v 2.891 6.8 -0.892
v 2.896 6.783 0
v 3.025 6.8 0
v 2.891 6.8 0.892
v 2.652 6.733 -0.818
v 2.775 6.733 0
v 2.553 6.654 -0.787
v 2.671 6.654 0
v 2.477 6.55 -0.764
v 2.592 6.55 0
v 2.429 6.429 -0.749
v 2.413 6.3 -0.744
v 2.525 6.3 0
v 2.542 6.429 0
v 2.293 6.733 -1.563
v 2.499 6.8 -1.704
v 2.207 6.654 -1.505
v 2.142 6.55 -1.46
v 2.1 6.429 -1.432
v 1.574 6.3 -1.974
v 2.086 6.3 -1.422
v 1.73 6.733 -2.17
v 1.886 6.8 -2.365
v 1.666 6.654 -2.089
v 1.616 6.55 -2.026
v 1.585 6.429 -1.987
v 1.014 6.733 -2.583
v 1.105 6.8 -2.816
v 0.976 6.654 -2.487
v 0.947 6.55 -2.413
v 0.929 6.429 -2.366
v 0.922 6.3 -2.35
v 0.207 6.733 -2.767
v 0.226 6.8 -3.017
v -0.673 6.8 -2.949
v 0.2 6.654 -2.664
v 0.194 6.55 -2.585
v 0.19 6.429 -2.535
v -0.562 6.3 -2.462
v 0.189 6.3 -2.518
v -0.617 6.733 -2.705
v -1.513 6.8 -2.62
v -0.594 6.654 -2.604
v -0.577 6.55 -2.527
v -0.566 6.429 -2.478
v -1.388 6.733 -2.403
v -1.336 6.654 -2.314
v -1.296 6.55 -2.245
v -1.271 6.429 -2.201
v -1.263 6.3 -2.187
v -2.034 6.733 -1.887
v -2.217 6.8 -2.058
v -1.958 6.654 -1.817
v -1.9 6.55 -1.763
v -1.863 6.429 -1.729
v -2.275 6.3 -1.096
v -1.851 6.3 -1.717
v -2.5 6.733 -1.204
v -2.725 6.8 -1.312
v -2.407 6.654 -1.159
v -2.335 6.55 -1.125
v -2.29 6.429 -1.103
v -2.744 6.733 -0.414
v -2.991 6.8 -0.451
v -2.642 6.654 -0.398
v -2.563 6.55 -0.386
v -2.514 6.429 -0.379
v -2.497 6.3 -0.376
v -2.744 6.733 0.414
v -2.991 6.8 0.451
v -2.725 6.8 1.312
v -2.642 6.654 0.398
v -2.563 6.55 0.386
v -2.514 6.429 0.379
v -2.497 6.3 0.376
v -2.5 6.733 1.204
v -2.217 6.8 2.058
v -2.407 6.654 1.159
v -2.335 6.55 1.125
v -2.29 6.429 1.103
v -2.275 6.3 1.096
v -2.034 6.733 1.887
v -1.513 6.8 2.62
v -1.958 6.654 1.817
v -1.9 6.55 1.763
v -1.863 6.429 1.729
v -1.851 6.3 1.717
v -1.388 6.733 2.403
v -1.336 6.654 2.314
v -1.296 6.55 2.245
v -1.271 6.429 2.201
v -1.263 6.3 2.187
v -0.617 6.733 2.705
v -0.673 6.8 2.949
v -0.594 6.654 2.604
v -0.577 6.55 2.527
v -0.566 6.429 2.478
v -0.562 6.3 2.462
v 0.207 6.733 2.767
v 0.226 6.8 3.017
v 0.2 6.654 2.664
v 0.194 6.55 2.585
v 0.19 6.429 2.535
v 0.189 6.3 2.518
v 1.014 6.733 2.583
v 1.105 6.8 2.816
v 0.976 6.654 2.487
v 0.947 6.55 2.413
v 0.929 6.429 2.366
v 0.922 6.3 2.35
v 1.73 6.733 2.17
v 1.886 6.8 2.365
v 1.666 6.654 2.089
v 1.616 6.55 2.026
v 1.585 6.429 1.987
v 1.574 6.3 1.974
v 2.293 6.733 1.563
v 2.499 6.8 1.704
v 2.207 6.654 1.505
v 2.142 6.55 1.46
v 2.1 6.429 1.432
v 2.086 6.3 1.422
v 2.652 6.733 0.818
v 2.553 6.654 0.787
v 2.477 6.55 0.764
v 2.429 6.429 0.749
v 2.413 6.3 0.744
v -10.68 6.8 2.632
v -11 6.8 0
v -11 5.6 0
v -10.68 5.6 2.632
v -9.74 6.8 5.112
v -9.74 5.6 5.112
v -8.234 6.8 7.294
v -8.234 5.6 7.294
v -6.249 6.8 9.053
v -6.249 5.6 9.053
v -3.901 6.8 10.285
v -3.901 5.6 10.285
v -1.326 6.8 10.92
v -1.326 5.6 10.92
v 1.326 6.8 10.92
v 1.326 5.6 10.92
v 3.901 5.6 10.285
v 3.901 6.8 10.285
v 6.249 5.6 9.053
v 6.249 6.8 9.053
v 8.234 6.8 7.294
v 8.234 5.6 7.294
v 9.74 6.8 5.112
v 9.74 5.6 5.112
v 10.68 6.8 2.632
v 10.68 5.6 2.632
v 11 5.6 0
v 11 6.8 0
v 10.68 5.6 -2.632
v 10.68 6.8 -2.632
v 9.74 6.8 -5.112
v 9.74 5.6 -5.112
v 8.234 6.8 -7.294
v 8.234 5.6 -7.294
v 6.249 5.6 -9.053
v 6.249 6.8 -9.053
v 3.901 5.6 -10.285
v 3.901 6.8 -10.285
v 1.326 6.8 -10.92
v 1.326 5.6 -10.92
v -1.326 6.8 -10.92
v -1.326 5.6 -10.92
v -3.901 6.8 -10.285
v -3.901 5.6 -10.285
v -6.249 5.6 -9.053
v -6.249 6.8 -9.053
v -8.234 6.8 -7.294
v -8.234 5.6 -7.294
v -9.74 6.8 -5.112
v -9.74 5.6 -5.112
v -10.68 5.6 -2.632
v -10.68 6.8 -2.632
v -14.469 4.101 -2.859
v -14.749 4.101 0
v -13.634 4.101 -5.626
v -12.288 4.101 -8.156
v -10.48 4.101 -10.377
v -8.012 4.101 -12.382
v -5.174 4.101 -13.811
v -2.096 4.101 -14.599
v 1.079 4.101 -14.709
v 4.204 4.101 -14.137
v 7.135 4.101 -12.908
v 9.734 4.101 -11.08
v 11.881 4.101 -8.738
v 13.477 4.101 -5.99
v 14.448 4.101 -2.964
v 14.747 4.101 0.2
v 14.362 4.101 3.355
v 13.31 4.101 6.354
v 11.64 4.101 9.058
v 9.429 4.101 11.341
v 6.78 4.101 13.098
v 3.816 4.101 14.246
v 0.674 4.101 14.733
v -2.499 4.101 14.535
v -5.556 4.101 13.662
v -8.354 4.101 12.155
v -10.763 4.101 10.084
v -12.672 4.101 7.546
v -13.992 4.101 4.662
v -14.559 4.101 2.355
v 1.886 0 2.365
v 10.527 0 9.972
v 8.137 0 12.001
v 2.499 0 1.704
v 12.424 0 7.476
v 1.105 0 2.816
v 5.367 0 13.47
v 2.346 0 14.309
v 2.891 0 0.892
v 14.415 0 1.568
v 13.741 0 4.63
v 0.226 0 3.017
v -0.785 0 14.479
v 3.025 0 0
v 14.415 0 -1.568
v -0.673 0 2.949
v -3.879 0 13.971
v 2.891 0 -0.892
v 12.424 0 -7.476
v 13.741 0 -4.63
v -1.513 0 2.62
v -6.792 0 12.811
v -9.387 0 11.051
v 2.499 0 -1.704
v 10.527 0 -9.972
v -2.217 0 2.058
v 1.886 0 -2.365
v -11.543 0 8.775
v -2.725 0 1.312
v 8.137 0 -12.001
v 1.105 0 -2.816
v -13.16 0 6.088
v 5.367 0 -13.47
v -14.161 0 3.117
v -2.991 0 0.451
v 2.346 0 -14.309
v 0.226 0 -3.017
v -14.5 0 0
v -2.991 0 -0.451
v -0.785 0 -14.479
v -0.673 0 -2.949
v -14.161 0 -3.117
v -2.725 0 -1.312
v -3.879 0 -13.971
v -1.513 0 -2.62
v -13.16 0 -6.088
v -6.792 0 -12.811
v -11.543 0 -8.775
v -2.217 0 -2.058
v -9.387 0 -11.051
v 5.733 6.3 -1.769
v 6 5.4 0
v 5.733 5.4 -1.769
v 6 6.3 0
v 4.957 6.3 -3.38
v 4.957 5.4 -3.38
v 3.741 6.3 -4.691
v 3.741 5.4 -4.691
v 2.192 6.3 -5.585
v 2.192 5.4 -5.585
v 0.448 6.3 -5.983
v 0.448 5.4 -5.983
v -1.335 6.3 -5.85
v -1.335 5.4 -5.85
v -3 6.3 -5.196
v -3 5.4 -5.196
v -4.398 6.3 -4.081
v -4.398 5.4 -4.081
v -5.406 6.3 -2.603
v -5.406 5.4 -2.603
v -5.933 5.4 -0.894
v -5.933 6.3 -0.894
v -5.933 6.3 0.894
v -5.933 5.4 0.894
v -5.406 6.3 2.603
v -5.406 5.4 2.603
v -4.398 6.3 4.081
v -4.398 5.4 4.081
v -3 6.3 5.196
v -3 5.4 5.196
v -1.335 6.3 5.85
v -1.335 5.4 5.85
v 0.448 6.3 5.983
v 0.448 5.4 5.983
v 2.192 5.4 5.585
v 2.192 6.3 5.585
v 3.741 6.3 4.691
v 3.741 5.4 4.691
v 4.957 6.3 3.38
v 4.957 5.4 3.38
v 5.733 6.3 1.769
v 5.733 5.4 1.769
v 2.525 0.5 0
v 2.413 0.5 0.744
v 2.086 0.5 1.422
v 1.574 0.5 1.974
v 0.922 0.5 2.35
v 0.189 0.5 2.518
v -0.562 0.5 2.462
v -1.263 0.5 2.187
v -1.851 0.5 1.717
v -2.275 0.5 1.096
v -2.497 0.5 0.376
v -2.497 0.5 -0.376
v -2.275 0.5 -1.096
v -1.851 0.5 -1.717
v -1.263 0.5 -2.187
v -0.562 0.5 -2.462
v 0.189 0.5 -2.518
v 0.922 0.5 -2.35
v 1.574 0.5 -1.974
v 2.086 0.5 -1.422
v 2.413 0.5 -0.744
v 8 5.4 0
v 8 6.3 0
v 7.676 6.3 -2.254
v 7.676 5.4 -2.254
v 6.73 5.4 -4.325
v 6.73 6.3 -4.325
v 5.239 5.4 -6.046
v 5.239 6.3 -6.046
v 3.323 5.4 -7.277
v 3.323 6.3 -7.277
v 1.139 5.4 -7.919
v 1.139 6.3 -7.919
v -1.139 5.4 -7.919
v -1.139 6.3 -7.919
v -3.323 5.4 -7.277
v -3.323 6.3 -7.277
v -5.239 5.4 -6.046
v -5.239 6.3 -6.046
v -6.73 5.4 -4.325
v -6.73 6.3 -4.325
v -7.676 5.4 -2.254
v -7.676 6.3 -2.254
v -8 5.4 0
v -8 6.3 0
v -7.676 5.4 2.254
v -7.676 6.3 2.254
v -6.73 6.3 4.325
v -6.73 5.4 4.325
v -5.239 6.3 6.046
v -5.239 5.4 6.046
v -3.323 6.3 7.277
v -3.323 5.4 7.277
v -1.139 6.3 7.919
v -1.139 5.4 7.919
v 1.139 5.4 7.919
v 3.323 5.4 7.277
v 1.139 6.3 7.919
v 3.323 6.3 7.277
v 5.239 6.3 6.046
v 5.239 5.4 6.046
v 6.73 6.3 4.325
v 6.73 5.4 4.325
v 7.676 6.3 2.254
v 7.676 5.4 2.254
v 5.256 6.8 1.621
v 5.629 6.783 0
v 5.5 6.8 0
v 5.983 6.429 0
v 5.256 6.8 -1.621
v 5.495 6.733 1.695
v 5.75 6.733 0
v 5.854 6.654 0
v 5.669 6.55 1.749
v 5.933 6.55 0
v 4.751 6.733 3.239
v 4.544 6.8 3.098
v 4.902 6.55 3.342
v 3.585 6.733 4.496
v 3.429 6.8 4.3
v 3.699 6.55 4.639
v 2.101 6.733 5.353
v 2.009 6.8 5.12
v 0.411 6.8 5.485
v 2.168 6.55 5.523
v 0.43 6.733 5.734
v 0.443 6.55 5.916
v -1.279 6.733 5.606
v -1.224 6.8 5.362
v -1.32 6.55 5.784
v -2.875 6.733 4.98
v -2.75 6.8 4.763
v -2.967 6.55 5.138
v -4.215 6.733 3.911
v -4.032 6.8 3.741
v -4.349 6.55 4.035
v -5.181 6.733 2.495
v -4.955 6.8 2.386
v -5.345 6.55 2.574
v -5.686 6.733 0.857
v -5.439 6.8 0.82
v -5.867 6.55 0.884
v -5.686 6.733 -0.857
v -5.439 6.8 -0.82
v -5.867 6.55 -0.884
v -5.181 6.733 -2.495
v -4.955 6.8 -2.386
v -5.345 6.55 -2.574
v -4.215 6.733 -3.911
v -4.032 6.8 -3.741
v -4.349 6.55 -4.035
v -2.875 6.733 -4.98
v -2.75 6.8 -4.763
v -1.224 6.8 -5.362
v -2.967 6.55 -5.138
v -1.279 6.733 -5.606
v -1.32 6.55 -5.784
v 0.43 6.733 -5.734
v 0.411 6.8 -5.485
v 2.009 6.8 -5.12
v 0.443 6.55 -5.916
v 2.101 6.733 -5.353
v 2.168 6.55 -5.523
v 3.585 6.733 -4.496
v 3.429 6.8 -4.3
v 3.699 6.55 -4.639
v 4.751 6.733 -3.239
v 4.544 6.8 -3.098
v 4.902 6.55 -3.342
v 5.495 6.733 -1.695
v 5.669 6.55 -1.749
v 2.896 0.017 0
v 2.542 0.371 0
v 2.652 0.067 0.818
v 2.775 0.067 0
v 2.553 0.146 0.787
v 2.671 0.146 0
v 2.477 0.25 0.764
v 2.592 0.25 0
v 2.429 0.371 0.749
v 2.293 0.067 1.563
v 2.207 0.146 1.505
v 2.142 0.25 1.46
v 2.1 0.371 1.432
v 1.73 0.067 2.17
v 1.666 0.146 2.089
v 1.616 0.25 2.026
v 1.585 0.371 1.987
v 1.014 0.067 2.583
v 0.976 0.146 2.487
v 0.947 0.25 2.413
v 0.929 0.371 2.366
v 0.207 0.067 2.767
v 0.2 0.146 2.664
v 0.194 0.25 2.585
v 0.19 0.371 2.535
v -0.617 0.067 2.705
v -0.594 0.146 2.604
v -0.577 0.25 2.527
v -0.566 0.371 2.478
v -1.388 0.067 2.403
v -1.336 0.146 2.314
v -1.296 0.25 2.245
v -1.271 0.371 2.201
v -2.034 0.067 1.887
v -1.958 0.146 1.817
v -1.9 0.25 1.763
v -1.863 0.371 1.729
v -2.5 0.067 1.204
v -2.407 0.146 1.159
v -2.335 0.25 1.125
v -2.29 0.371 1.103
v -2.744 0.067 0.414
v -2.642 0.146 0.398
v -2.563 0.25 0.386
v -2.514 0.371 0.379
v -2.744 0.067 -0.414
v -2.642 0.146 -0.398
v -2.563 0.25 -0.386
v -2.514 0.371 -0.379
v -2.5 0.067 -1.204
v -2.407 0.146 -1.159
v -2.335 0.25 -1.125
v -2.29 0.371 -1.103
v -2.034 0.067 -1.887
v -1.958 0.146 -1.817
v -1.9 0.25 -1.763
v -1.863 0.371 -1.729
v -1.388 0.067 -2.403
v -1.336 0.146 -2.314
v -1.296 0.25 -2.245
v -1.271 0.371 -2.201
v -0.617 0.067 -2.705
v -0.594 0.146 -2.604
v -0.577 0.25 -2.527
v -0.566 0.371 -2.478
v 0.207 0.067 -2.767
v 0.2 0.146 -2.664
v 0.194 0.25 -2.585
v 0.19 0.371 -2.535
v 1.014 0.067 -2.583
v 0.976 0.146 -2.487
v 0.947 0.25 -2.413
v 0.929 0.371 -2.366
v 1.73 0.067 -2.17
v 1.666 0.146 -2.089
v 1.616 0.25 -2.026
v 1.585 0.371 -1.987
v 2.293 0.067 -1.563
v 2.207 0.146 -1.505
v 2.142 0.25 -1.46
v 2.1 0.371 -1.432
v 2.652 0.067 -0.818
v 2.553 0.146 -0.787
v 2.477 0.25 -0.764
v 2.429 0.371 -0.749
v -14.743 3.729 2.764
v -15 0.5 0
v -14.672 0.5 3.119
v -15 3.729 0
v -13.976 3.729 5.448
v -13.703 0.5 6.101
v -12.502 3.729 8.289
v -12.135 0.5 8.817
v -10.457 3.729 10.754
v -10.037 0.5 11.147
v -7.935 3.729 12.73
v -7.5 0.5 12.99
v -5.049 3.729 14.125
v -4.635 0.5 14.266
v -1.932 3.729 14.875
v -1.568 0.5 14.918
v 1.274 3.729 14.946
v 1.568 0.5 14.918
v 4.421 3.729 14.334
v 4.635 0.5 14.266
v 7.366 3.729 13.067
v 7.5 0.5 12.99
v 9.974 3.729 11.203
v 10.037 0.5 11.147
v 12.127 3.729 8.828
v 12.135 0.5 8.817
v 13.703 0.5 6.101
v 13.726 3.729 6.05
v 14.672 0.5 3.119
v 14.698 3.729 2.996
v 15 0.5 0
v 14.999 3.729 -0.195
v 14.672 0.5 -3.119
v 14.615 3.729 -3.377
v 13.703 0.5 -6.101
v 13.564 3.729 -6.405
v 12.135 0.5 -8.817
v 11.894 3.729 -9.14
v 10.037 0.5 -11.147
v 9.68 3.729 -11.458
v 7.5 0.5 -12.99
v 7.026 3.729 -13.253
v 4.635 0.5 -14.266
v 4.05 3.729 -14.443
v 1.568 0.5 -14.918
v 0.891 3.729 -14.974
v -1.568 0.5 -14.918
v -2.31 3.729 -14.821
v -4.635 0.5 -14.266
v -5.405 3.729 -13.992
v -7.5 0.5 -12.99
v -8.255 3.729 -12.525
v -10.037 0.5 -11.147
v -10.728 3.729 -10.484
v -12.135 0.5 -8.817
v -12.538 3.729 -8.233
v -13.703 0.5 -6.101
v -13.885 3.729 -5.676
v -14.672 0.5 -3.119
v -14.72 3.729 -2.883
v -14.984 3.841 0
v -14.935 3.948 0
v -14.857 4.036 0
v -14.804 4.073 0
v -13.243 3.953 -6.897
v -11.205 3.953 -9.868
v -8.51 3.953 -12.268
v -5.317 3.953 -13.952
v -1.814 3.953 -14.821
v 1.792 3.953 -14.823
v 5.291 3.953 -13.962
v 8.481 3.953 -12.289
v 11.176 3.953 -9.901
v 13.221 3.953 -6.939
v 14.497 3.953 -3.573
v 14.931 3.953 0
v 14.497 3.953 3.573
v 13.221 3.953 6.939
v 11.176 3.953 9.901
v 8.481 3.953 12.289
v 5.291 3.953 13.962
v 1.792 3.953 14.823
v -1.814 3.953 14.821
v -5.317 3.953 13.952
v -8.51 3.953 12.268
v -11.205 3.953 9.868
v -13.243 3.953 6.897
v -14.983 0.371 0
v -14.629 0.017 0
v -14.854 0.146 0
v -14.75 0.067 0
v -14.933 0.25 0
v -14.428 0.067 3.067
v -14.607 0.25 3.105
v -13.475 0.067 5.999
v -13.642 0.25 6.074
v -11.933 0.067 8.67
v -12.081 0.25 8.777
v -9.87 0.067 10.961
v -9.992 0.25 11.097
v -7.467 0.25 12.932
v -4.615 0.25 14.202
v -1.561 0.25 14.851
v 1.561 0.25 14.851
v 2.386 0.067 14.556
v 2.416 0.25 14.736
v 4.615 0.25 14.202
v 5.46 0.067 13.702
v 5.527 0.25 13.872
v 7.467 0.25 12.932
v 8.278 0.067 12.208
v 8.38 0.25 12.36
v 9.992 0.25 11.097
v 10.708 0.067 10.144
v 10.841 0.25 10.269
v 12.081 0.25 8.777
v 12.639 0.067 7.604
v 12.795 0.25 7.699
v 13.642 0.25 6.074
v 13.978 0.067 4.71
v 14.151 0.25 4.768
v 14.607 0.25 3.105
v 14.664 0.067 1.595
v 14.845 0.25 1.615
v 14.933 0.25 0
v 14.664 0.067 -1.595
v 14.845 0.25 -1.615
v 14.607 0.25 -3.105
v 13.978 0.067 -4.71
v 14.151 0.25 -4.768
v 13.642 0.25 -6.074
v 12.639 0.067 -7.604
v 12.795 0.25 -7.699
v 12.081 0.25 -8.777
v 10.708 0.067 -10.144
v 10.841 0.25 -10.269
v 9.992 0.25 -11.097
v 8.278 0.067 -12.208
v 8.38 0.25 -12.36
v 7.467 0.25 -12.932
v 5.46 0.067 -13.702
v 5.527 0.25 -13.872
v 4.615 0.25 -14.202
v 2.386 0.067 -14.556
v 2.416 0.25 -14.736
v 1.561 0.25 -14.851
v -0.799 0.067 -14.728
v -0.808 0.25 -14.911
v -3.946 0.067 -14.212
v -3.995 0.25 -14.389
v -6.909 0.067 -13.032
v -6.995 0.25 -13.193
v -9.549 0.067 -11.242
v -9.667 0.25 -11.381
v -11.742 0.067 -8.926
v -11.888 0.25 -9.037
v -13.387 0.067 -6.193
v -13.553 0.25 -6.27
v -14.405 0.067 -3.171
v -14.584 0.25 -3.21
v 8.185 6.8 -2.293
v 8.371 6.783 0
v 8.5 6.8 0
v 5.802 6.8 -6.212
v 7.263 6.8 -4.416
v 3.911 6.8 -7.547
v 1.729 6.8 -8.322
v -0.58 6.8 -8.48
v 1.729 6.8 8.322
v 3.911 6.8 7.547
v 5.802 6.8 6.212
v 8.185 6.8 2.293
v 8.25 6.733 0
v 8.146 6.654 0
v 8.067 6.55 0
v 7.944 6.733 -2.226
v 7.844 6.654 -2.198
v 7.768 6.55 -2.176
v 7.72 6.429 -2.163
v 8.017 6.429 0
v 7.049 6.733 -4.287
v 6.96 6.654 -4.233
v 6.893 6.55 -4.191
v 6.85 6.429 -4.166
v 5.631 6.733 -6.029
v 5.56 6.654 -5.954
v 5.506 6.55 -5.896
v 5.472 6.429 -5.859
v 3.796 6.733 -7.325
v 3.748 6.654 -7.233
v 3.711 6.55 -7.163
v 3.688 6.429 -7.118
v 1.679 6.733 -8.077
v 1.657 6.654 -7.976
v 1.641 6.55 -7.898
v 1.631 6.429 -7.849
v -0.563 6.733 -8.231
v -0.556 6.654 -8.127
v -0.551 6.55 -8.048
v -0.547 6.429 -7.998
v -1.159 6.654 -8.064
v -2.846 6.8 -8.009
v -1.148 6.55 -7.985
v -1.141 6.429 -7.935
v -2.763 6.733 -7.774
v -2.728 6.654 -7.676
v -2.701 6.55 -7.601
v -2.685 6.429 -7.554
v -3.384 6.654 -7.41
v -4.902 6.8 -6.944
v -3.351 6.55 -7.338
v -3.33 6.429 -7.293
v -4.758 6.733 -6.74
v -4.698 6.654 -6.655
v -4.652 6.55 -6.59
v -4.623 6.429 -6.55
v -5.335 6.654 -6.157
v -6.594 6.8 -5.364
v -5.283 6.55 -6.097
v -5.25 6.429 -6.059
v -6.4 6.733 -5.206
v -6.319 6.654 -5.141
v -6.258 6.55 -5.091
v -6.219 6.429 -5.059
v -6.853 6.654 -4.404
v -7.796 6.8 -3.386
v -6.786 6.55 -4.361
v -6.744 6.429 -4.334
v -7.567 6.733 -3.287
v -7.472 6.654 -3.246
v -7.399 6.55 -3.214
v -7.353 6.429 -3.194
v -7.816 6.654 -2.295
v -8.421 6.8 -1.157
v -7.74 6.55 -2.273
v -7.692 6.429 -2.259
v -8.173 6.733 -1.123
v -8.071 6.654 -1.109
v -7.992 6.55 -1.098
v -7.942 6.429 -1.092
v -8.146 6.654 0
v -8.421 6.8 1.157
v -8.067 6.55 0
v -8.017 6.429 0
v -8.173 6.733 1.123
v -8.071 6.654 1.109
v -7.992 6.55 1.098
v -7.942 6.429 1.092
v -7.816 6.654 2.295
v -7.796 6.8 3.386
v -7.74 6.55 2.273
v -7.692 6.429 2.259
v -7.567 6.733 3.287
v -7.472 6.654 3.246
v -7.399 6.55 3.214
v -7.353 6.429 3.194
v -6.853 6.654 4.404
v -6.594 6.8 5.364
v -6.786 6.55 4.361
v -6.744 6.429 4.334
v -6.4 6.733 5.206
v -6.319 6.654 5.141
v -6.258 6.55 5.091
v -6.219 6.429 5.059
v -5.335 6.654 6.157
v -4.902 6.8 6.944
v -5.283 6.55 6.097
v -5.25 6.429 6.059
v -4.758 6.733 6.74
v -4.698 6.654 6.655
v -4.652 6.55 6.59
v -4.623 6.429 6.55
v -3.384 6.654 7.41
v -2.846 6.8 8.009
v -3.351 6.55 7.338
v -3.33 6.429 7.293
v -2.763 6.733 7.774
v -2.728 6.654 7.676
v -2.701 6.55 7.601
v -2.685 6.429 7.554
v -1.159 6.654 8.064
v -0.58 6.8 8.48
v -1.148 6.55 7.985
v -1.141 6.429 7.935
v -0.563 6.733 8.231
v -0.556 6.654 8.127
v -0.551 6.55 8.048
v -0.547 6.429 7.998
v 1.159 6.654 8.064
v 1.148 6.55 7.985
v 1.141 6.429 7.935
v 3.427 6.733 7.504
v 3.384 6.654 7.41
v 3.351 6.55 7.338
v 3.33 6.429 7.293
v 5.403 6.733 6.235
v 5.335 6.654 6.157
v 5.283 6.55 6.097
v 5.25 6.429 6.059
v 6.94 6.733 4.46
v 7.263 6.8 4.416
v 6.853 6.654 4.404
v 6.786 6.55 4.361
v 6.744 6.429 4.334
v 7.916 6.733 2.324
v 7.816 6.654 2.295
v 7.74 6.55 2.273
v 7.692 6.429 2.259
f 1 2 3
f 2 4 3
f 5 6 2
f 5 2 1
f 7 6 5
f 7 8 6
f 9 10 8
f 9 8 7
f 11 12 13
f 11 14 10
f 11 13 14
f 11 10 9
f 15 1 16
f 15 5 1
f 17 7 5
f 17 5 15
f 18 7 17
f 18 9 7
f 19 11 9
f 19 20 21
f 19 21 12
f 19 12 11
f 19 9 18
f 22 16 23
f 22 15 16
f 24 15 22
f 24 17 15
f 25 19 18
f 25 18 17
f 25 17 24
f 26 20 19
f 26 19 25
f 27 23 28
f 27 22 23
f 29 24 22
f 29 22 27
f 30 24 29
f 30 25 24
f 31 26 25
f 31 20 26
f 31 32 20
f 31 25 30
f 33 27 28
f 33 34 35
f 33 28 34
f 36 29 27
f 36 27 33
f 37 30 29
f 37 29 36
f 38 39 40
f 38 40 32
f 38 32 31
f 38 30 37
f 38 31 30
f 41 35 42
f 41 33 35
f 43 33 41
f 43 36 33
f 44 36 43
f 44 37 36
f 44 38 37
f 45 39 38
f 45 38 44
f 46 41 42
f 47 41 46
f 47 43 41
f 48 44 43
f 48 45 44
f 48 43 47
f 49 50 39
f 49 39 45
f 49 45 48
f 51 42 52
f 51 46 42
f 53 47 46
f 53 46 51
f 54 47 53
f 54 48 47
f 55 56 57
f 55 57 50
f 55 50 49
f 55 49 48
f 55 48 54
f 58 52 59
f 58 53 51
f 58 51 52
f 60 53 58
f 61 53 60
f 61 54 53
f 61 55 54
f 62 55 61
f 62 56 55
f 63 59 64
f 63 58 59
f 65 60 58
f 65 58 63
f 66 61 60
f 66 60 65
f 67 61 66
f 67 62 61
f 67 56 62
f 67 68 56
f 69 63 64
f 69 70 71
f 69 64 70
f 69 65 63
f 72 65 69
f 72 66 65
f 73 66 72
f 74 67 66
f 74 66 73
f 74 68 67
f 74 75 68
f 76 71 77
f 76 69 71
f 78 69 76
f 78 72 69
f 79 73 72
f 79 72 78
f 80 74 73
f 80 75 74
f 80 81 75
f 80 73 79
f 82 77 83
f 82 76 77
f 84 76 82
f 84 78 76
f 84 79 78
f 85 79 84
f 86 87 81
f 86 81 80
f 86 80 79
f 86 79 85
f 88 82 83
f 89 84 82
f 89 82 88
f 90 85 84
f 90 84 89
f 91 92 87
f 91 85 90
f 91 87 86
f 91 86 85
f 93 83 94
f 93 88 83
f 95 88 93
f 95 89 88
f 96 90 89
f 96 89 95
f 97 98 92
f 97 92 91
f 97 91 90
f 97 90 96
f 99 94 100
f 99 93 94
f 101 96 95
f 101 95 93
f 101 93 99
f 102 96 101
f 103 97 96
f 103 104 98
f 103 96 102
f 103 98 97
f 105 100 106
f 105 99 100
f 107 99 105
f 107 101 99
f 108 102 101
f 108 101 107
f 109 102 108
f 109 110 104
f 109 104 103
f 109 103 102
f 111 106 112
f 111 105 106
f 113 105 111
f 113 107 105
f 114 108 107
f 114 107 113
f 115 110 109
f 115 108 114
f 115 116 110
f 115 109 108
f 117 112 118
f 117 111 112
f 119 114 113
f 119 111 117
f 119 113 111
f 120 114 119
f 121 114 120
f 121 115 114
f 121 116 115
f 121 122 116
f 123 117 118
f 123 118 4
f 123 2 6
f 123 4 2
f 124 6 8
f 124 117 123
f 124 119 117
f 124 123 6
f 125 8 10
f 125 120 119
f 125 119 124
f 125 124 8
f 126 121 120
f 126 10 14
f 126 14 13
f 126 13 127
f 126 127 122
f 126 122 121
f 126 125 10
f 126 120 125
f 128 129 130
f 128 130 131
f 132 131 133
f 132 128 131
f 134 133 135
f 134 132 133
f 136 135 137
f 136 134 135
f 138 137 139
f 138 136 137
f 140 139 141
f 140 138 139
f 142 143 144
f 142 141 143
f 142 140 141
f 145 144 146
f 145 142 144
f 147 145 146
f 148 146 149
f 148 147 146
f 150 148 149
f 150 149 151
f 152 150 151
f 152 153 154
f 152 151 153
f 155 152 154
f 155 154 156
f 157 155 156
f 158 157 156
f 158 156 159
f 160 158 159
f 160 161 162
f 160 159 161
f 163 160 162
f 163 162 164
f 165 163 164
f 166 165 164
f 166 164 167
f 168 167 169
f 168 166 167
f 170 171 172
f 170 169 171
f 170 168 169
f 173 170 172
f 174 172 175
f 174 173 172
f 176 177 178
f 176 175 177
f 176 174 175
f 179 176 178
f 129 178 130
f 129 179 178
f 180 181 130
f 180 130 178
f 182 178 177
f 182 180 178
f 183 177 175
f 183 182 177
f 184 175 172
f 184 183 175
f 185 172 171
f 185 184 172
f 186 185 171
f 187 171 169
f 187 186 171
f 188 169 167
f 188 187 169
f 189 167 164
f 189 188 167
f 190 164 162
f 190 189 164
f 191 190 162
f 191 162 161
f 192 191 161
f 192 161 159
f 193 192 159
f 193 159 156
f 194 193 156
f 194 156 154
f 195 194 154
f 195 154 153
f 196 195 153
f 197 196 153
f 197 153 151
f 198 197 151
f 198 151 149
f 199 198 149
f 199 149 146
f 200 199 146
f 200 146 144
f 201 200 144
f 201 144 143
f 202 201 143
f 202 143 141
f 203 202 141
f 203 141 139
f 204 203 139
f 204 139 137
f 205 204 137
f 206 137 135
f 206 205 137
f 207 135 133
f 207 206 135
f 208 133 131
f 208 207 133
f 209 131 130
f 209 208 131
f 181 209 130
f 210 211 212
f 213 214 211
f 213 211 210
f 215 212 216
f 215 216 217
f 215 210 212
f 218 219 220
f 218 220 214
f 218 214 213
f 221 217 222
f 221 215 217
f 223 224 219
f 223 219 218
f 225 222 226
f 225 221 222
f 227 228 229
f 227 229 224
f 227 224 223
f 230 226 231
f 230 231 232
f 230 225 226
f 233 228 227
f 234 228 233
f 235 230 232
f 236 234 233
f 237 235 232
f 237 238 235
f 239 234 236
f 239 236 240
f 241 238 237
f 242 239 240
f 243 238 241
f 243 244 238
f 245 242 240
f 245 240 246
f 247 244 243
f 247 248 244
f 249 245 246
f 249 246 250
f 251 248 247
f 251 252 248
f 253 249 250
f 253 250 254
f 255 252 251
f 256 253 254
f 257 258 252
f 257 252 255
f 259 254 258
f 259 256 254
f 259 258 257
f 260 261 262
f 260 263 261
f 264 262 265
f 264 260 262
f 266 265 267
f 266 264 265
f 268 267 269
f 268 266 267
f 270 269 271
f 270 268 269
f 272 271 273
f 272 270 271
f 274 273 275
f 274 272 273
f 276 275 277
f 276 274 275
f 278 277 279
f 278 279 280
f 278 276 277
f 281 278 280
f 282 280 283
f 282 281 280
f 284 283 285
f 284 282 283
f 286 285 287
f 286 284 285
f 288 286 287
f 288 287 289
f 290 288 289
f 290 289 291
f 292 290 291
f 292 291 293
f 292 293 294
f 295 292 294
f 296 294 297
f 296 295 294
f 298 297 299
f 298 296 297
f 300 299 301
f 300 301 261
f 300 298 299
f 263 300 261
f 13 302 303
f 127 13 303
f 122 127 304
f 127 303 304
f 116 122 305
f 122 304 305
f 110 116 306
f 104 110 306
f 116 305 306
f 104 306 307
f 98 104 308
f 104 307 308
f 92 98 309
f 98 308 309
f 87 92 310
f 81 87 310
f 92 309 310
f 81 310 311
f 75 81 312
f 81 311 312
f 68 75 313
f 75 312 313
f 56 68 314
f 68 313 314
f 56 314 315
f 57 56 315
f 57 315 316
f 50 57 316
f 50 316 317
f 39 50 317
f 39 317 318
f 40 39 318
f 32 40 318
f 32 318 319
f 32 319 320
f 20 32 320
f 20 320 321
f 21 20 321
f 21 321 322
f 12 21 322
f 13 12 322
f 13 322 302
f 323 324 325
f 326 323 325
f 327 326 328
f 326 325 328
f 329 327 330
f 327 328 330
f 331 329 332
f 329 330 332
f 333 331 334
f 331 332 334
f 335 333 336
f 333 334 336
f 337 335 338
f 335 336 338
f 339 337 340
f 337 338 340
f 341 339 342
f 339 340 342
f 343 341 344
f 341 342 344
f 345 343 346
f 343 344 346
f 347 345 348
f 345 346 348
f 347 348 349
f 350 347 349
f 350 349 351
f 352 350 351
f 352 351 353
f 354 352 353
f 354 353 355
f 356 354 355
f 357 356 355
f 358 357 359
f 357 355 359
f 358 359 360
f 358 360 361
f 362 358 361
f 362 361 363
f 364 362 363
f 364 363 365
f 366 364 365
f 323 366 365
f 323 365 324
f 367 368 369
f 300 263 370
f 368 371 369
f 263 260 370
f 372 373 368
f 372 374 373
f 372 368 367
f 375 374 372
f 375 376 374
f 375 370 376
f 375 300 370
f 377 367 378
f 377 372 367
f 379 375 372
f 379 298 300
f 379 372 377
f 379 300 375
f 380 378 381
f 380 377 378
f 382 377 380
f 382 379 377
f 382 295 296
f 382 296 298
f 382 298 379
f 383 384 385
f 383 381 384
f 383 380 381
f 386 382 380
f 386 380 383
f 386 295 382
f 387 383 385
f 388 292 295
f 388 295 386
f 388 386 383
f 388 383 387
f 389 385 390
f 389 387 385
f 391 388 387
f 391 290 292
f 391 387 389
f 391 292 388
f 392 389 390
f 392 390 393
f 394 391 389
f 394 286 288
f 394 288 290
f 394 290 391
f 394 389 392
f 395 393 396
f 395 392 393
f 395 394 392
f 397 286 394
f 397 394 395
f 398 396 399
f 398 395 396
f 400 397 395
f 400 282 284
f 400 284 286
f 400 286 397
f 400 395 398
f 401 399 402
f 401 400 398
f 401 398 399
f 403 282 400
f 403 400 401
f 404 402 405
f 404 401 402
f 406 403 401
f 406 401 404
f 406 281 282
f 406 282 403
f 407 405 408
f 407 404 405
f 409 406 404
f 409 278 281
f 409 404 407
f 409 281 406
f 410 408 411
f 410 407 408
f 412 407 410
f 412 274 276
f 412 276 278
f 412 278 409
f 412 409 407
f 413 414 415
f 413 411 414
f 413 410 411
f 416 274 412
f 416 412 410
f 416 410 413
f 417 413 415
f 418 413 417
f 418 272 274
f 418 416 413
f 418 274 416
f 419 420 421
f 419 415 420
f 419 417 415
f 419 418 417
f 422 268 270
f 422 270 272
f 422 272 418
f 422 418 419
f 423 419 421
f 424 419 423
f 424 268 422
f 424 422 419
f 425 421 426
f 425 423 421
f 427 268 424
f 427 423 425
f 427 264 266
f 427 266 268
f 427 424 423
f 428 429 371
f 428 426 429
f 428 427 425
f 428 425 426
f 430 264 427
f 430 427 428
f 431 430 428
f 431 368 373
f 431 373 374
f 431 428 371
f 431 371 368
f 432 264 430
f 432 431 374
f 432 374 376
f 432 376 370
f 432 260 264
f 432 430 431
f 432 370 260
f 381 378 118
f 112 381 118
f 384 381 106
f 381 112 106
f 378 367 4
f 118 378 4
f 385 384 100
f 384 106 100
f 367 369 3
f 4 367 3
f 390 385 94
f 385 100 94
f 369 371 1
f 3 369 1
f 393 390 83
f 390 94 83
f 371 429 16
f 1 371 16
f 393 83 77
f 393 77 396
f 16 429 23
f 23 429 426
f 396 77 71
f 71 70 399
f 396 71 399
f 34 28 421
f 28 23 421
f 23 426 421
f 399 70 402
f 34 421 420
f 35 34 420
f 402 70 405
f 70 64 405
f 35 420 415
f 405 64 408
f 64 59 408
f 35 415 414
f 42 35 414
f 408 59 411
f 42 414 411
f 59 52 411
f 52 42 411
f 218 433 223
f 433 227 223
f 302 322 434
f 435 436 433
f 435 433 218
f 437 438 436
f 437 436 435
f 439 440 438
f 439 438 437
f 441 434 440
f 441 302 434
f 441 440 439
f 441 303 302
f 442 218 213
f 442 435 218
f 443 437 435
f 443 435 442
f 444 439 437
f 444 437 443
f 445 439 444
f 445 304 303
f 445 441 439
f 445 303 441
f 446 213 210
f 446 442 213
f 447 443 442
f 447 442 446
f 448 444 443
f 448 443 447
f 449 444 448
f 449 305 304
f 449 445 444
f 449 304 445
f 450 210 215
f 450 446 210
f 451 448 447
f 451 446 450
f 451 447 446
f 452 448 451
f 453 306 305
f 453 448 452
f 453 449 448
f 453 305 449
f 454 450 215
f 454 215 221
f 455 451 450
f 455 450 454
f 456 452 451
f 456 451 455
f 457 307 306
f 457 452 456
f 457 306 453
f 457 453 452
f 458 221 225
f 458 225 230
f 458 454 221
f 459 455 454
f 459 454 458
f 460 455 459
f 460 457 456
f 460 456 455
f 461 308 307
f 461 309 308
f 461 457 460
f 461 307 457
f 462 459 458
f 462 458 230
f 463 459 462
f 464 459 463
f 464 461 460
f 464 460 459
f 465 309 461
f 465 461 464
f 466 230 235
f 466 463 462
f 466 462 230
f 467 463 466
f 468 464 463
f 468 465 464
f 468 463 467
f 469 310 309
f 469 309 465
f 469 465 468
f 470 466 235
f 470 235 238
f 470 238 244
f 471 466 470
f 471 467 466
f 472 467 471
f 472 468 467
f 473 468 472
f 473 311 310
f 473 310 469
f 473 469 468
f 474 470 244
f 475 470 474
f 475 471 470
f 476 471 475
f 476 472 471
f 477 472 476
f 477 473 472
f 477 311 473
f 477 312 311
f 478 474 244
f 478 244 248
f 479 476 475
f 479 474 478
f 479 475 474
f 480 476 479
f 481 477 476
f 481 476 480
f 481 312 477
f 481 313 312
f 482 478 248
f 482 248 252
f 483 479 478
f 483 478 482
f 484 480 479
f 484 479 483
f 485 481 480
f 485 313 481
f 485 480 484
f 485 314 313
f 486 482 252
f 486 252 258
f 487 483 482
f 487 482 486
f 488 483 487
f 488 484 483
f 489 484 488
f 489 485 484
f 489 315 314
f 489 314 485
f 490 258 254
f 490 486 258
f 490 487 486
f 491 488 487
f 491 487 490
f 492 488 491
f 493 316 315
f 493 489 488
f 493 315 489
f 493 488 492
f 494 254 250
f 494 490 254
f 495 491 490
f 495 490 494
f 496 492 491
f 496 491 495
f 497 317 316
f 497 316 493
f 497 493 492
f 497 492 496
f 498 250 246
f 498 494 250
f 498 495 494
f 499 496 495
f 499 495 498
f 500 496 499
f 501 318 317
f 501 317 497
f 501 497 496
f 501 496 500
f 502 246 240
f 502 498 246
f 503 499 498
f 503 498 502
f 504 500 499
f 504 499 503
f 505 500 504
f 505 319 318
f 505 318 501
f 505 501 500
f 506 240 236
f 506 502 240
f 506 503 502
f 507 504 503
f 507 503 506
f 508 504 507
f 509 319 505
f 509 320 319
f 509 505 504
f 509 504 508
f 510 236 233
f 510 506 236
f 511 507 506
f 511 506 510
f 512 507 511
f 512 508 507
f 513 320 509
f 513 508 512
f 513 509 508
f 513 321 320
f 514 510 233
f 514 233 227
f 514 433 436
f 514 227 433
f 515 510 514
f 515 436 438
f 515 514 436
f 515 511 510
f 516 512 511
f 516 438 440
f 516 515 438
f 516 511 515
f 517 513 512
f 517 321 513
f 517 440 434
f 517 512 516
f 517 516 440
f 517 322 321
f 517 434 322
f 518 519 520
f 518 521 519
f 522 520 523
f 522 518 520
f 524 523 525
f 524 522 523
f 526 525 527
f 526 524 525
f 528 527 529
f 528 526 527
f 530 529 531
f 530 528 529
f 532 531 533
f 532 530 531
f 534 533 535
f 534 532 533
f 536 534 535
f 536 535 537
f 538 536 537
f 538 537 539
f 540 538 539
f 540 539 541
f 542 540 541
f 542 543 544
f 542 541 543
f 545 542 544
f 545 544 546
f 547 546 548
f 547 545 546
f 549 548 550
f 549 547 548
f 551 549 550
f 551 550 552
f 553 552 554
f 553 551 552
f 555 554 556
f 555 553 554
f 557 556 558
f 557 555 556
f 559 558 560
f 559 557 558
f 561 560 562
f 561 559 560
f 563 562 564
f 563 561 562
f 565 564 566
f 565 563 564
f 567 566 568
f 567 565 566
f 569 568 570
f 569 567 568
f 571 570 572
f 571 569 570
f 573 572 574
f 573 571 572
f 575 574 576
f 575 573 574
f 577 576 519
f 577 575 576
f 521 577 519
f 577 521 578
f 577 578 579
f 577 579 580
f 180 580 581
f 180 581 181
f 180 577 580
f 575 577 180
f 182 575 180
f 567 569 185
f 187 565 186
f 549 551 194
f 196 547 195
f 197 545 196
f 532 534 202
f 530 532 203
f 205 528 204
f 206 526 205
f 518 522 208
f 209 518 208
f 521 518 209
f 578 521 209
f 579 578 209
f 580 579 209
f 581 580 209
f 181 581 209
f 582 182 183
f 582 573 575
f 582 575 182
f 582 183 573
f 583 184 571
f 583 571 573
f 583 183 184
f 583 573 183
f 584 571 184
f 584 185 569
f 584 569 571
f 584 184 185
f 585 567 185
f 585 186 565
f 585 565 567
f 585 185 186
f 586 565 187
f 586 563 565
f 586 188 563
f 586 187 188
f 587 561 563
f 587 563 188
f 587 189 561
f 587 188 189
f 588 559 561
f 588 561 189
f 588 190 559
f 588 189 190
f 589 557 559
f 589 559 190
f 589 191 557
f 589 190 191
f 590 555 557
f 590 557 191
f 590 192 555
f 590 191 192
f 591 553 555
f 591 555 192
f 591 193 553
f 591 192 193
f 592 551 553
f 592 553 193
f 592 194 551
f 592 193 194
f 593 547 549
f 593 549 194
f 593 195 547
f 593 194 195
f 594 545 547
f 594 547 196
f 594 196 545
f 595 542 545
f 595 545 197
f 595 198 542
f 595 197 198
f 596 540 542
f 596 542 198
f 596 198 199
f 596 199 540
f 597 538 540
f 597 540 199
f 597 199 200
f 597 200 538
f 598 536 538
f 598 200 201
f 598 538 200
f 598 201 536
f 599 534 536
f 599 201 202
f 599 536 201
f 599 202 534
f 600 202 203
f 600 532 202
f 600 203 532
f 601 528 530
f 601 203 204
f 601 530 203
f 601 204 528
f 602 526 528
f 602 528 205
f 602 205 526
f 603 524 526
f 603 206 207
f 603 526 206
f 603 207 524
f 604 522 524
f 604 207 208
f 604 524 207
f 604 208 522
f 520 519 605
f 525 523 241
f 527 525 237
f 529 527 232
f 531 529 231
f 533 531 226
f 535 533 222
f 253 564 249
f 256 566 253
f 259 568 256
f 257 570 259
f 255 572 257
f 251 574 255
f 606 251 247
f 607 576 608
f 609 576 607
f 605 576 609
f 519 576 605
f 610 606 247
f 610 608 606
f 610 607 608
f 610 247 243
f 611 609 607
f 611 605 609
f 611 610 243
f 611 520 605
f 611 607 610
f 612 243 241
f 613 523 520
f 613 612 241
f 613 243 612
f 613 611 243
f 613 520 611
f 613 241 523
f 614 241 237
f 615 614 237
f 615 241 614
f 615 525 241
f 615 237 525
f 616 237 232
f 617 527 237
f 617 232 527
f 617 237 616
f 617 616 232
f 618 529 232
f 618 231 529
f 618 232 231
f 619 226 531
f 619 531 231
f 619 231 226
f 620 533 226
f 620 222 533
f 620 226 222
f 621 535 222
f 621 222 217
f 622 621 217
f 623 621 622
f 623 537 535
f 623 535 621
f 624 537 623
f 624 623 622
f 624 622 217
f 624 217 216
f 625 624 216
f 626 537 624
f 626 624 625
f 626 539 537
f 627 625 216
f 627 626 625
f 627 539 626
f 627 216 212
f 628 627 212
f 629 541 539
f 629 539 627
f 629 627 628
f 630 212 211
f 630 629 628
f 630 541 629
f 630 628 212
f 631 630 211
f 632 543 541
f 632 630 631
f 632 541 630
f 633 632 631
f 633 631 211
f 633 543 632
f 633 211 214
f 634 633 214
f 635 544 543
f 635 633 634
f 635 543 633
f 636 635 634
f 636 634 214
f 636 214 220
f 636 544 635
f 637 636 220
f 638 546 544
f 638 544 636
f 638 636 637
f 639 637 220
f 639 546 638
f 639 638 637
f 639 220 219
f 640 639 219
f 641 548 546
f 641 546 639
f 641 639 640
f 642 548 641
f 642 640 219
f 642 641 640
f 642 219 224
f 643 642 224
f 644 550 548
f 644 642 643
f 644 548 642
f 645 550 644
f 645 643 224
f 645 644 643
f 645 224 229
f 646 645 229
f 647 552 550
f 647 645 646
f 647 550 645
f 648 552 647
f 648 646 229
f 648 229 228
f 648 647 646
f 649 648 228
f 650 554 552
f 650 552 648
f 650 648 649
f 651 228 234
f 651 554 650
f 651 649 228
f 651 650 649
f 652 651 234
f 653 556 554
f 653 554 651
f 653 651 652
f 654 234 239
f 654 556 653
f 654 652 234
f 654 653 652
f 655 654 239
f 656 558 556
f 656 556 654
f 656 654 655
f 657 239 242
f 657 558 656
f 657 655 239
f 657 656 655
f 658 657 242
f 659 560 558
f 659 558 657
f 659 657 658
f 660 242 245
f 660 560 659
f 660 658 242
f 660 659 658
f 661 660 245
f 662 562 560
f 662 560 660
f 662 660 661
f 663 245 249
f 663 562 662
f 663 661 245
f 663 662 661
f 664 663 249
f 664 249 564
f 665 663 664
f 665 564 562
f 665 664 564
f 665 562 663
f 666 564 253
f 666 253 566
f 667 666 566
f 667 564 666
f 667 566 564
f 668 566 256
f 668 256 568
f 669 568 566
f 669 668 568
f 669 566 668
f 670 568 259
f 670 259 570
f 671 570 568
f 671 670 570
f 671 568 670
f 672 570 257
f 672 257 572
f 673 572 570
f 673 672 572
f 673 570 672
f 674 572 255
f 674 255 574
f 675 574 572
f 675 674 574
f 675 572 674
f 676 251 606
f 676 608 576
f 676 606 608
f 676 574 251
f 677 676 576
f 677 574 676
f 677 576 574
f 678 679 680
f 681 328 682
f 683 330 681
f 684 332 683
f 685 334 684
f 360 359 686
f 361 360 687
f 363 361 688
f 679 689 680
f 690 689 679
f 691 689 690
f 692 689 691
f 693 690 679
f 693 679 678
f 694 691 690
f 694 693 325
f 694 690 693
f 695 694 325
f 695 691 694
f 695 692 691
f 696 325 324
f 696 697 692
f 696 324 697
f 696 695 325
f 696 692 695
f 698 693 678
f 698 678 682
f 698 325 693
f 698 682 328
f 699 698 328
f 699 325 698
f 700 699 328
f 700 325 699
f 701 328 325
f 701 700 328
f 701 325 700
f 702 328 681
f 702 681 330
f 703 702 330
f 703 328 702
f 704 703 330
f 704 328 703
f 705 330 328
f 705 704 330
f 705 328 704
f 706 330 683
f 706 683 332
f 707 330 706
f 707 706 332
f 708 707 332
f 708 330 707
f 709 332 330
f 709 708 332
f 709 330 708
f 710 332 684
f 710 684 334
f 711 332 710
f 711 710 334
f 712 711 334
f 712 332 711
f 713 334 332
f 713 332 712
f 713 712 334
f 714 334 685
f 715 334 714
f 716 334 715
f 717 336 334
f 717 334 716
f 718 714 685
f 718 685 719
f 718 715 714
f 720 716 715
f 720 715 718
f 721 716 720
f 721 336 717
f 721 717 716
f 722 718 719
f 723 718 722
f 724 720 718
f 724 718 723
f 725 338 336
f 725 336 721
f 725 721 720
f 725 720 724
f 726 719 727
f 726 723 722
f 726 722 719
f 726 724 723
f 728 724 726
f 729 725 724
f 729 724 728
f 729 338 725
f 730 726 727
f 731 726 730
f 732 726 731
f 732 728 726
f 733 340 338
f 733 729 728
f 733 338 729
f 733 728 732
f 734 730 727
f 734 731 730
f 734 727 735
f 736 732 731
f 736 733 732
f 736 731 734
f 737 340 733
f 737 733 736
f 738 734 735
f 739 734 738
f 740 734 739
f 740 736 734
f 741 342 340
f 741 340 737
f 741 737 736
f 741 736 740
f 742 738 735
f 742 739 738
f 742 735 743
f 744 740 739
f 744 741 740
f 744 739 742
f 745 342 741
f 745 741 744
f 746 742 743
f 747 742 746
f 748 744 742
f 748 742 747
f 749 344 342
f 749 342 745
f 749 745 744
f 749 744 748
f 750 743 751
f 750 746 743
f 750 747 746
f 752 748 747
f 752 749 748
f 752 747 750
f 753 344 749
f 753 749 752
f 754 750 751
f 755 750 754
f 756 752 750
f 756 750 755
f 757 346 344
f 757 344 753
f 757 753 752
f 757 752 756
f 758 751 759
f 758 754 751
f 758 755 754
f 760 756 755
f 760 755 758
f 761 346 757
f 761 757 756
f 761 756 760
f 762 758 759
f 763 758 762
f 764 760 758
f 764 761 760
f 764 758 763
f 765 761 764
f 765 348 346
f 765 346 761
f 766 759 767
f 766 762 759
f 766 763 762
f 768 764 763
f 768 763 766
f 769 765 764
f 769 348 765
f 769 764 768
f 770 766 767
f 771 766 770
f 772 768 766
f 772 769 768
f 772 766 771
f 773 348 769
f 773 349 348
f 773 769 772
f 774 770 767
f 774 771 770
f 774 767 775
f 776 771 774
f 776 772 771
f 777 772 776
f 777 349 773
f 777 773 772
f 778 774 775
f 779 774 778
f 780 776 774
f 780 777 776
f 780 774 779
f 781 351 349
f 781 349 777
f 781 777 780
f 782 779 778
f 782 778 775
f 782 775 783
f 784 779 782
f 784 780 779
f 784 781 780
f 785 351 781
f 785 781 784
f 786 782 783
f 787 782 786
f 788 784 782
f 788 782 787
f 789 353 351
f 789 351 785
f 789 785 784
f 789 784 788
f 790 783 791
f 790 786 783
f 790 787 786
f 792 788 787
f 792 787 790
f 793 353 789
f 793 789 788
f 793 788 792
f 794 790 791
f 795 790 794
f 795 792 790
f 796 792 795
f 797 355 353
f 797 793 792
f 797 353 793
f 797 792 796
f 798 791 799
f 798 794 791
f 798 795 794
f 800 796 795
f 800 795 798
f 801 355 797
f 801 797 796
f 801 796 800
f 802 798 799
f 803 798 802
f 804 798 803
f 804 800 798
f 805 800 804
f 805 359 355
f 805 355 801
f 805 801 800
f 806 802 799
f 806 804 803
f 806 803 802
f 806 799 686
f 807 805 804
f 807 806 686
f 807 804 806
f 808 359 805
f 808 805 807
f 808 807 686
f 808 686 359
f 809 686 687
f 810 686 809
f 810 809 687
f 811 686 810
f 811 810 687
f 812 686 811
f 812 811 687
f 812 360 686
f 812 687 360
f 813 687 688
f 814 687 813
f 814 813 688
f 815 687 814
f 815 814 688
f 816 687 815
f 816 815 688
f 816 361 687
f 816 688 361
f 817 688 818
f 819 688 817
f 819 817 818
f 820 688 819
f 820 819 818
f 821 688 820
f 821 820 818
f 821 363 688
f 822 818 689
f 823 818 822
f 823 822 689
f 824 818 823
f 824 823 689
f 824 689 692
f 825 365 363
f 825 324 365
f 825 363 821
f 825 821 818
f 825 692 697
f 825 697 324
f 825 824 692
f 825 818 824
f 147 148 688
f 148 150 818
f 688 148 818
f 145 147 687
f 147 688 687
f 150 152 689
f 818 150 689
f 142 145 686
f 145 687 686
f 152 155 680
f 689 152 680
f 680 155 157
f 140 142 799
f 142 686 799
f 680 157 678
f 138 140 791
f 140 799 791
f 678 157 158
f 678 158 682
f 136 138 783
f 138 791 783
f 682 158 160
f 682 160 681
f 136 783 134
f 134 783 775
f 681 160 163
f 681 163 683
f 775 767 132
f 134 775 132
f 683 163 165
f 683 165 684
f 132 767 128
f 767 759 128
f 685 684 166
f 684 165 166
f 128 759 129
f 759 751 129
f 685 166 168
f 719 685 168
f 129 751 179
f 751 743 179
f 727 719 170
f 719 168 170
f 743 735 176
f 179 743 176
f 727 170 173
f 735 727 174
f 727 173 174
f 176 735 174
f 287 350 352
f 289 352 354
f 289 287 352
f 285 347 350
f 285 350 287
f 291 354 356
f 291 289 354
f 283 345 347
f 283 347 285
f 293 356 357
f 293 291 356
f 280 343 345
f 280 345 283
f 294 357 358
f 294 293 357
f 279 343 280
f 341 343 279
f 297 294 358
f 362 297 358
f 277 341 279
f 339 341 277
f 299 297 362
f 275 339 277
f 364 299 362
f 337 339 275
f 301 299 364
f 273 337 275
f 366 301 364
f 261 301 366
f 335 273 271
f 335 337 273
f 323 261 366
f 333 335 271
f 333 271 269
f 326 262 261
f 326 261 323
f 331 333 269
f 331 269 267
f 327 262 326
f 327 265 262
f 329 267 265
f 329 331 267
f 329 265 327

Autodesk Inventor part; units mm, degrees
ref_plane "YZ Plane" through (0, 0, 0) normal (1, 0, 0) x (0, 1, 0)
ref_plane "XZ Plane" through (0, 0, 0) normal (0, 1, 0) x (-1, 0, 0)
ref_plane "XY Plane" through (0, 0, 0) normal (0, 0, 1) x (1, 0, 0)
sketch "Sketch1" plane through (0, 0, 0) normal (0, 0, 1) x (1, 0, 0)
  line L0 (0, 0) -> (-15, 0)
  line L1 (-15, 0) -> (-15, 4)
  line L2 (-15, 4) -> (-11, 5.6)
  line L3 (-11, 5.6) -> (-11, 6.8)
  line L4 (-11, 6.8) -> (0, 6.8)
  line L5 (0, 6.8) -> (0, 0)
  dimension "d1" = 4
  dimension "d5" = 1.2
  dimension "d12" = 11
  dimension "d13" = 2.8
  dimension "d14" = 4
revolve "Revolution1" add sketch "Sketch1" angle 360 about axis through (0, 6.8, 0) along (0, -1, 0)
fillet "Fillet1" radius 0.5 1 edges at (15, 0, 0)
sketch "Sketch3" plane through (0, 0, 0) normal (0, -1, 0) x (1, 0, 0)
  circle A0 centre (0, 0) radius 2.525
  point P0 (0, 0)
  dimension "d15" = 5.05
extrude "Extrusion2" cut sketch "Sketch3" against normal up to surface (6.8 mm away)
fillet "Fillet2" radius 0.4 1 edges at (15, 4, 0)
sketch "Sketch4" plane through (0, 6.8, 0) normal (0, 1, 0) x (1, 0, 0)
  circle A0 centre (0, 0) radius 8
  circle A1 centre (0, 0) radius 6
  point P0 (0, 0)
  dimension "d19" = 16
  dimension "d20" = 2
extrude "Extrusion3" cut sketch "Sketch4" against normal blind 1.4
fillet "Fillet3" radius 0.5 2 edges at (-8, 6.8, 0) (-6, 6.8, 0)
fillet "Fillet4" radius 0.5 2 edges at (-2.525, 6.8, 0) (-2.525, 0, 0)
properties part number "pulley_part_2"
